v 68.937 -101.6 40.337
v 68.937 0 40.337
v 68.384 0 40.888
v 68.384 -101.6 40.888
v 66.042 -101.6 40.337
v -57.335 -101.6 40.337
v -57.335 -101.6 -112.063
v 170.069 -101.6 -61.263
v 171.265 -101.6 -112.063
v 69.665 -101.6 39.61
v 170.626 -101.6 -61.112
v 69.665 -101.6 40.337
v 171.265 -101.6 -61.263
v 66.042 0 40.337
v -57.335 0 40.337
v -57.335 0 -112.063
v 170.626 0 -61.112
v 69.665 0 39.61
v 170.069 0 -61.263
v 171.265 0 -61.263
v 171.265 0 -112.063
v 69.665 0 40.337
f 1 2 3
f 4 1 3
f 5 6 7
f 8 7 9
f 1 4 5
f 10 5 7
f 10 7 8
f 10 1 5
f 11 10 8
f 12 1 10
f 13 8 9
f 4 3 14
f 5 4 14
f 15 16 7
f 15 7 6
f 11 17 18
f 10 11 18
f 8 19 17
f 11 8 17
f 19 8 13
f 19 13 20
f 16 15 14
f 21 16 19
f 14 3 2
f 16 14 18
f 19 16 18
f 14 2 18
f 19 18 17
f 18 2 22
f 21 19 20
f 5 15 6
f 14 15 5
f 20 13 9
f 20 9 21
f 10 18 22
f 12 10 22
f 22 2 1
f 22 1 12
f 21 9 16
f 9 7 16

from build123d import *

# Parameters (mm, degrees)
F0_W     = 127
F0_H     = 152.4
F1_DEPTH = 101.6
F2_W     = 101.6
F2_H     = 50.8
F3_DEPTH = 101.6
F5_DEPTH = 101.6


with BuildPart() as f1:
    # F0 (on Front) → F1 (new body)
    with BuildSketch(Plane.XZ):
        with Locations((6.165242, -35.863342)):
            Rectangle(F0_W, F0_H)
    extrude(amount=F1_DEPTH)

    # F2 (on face) → F3 (join)
    with BuildSketch(Plane.YZ.offset(69.665242)):
        with Locations((-50.8, -86.663342)):
            Rectangle(F2_W, F2_H)
    extrude(amount=F3_DEPTH)

    # F4 (on Front) → F5 (join)
    with BuildSketch(Plane.XZ):
        Polygon((68.383813, 40.888175), (-30.263531, 17.656446), (67.372276, -89.133667), (170.625895, -61.112218), align=None)
    extrude(amount=F5_DEPTH)


solid = f1.part
